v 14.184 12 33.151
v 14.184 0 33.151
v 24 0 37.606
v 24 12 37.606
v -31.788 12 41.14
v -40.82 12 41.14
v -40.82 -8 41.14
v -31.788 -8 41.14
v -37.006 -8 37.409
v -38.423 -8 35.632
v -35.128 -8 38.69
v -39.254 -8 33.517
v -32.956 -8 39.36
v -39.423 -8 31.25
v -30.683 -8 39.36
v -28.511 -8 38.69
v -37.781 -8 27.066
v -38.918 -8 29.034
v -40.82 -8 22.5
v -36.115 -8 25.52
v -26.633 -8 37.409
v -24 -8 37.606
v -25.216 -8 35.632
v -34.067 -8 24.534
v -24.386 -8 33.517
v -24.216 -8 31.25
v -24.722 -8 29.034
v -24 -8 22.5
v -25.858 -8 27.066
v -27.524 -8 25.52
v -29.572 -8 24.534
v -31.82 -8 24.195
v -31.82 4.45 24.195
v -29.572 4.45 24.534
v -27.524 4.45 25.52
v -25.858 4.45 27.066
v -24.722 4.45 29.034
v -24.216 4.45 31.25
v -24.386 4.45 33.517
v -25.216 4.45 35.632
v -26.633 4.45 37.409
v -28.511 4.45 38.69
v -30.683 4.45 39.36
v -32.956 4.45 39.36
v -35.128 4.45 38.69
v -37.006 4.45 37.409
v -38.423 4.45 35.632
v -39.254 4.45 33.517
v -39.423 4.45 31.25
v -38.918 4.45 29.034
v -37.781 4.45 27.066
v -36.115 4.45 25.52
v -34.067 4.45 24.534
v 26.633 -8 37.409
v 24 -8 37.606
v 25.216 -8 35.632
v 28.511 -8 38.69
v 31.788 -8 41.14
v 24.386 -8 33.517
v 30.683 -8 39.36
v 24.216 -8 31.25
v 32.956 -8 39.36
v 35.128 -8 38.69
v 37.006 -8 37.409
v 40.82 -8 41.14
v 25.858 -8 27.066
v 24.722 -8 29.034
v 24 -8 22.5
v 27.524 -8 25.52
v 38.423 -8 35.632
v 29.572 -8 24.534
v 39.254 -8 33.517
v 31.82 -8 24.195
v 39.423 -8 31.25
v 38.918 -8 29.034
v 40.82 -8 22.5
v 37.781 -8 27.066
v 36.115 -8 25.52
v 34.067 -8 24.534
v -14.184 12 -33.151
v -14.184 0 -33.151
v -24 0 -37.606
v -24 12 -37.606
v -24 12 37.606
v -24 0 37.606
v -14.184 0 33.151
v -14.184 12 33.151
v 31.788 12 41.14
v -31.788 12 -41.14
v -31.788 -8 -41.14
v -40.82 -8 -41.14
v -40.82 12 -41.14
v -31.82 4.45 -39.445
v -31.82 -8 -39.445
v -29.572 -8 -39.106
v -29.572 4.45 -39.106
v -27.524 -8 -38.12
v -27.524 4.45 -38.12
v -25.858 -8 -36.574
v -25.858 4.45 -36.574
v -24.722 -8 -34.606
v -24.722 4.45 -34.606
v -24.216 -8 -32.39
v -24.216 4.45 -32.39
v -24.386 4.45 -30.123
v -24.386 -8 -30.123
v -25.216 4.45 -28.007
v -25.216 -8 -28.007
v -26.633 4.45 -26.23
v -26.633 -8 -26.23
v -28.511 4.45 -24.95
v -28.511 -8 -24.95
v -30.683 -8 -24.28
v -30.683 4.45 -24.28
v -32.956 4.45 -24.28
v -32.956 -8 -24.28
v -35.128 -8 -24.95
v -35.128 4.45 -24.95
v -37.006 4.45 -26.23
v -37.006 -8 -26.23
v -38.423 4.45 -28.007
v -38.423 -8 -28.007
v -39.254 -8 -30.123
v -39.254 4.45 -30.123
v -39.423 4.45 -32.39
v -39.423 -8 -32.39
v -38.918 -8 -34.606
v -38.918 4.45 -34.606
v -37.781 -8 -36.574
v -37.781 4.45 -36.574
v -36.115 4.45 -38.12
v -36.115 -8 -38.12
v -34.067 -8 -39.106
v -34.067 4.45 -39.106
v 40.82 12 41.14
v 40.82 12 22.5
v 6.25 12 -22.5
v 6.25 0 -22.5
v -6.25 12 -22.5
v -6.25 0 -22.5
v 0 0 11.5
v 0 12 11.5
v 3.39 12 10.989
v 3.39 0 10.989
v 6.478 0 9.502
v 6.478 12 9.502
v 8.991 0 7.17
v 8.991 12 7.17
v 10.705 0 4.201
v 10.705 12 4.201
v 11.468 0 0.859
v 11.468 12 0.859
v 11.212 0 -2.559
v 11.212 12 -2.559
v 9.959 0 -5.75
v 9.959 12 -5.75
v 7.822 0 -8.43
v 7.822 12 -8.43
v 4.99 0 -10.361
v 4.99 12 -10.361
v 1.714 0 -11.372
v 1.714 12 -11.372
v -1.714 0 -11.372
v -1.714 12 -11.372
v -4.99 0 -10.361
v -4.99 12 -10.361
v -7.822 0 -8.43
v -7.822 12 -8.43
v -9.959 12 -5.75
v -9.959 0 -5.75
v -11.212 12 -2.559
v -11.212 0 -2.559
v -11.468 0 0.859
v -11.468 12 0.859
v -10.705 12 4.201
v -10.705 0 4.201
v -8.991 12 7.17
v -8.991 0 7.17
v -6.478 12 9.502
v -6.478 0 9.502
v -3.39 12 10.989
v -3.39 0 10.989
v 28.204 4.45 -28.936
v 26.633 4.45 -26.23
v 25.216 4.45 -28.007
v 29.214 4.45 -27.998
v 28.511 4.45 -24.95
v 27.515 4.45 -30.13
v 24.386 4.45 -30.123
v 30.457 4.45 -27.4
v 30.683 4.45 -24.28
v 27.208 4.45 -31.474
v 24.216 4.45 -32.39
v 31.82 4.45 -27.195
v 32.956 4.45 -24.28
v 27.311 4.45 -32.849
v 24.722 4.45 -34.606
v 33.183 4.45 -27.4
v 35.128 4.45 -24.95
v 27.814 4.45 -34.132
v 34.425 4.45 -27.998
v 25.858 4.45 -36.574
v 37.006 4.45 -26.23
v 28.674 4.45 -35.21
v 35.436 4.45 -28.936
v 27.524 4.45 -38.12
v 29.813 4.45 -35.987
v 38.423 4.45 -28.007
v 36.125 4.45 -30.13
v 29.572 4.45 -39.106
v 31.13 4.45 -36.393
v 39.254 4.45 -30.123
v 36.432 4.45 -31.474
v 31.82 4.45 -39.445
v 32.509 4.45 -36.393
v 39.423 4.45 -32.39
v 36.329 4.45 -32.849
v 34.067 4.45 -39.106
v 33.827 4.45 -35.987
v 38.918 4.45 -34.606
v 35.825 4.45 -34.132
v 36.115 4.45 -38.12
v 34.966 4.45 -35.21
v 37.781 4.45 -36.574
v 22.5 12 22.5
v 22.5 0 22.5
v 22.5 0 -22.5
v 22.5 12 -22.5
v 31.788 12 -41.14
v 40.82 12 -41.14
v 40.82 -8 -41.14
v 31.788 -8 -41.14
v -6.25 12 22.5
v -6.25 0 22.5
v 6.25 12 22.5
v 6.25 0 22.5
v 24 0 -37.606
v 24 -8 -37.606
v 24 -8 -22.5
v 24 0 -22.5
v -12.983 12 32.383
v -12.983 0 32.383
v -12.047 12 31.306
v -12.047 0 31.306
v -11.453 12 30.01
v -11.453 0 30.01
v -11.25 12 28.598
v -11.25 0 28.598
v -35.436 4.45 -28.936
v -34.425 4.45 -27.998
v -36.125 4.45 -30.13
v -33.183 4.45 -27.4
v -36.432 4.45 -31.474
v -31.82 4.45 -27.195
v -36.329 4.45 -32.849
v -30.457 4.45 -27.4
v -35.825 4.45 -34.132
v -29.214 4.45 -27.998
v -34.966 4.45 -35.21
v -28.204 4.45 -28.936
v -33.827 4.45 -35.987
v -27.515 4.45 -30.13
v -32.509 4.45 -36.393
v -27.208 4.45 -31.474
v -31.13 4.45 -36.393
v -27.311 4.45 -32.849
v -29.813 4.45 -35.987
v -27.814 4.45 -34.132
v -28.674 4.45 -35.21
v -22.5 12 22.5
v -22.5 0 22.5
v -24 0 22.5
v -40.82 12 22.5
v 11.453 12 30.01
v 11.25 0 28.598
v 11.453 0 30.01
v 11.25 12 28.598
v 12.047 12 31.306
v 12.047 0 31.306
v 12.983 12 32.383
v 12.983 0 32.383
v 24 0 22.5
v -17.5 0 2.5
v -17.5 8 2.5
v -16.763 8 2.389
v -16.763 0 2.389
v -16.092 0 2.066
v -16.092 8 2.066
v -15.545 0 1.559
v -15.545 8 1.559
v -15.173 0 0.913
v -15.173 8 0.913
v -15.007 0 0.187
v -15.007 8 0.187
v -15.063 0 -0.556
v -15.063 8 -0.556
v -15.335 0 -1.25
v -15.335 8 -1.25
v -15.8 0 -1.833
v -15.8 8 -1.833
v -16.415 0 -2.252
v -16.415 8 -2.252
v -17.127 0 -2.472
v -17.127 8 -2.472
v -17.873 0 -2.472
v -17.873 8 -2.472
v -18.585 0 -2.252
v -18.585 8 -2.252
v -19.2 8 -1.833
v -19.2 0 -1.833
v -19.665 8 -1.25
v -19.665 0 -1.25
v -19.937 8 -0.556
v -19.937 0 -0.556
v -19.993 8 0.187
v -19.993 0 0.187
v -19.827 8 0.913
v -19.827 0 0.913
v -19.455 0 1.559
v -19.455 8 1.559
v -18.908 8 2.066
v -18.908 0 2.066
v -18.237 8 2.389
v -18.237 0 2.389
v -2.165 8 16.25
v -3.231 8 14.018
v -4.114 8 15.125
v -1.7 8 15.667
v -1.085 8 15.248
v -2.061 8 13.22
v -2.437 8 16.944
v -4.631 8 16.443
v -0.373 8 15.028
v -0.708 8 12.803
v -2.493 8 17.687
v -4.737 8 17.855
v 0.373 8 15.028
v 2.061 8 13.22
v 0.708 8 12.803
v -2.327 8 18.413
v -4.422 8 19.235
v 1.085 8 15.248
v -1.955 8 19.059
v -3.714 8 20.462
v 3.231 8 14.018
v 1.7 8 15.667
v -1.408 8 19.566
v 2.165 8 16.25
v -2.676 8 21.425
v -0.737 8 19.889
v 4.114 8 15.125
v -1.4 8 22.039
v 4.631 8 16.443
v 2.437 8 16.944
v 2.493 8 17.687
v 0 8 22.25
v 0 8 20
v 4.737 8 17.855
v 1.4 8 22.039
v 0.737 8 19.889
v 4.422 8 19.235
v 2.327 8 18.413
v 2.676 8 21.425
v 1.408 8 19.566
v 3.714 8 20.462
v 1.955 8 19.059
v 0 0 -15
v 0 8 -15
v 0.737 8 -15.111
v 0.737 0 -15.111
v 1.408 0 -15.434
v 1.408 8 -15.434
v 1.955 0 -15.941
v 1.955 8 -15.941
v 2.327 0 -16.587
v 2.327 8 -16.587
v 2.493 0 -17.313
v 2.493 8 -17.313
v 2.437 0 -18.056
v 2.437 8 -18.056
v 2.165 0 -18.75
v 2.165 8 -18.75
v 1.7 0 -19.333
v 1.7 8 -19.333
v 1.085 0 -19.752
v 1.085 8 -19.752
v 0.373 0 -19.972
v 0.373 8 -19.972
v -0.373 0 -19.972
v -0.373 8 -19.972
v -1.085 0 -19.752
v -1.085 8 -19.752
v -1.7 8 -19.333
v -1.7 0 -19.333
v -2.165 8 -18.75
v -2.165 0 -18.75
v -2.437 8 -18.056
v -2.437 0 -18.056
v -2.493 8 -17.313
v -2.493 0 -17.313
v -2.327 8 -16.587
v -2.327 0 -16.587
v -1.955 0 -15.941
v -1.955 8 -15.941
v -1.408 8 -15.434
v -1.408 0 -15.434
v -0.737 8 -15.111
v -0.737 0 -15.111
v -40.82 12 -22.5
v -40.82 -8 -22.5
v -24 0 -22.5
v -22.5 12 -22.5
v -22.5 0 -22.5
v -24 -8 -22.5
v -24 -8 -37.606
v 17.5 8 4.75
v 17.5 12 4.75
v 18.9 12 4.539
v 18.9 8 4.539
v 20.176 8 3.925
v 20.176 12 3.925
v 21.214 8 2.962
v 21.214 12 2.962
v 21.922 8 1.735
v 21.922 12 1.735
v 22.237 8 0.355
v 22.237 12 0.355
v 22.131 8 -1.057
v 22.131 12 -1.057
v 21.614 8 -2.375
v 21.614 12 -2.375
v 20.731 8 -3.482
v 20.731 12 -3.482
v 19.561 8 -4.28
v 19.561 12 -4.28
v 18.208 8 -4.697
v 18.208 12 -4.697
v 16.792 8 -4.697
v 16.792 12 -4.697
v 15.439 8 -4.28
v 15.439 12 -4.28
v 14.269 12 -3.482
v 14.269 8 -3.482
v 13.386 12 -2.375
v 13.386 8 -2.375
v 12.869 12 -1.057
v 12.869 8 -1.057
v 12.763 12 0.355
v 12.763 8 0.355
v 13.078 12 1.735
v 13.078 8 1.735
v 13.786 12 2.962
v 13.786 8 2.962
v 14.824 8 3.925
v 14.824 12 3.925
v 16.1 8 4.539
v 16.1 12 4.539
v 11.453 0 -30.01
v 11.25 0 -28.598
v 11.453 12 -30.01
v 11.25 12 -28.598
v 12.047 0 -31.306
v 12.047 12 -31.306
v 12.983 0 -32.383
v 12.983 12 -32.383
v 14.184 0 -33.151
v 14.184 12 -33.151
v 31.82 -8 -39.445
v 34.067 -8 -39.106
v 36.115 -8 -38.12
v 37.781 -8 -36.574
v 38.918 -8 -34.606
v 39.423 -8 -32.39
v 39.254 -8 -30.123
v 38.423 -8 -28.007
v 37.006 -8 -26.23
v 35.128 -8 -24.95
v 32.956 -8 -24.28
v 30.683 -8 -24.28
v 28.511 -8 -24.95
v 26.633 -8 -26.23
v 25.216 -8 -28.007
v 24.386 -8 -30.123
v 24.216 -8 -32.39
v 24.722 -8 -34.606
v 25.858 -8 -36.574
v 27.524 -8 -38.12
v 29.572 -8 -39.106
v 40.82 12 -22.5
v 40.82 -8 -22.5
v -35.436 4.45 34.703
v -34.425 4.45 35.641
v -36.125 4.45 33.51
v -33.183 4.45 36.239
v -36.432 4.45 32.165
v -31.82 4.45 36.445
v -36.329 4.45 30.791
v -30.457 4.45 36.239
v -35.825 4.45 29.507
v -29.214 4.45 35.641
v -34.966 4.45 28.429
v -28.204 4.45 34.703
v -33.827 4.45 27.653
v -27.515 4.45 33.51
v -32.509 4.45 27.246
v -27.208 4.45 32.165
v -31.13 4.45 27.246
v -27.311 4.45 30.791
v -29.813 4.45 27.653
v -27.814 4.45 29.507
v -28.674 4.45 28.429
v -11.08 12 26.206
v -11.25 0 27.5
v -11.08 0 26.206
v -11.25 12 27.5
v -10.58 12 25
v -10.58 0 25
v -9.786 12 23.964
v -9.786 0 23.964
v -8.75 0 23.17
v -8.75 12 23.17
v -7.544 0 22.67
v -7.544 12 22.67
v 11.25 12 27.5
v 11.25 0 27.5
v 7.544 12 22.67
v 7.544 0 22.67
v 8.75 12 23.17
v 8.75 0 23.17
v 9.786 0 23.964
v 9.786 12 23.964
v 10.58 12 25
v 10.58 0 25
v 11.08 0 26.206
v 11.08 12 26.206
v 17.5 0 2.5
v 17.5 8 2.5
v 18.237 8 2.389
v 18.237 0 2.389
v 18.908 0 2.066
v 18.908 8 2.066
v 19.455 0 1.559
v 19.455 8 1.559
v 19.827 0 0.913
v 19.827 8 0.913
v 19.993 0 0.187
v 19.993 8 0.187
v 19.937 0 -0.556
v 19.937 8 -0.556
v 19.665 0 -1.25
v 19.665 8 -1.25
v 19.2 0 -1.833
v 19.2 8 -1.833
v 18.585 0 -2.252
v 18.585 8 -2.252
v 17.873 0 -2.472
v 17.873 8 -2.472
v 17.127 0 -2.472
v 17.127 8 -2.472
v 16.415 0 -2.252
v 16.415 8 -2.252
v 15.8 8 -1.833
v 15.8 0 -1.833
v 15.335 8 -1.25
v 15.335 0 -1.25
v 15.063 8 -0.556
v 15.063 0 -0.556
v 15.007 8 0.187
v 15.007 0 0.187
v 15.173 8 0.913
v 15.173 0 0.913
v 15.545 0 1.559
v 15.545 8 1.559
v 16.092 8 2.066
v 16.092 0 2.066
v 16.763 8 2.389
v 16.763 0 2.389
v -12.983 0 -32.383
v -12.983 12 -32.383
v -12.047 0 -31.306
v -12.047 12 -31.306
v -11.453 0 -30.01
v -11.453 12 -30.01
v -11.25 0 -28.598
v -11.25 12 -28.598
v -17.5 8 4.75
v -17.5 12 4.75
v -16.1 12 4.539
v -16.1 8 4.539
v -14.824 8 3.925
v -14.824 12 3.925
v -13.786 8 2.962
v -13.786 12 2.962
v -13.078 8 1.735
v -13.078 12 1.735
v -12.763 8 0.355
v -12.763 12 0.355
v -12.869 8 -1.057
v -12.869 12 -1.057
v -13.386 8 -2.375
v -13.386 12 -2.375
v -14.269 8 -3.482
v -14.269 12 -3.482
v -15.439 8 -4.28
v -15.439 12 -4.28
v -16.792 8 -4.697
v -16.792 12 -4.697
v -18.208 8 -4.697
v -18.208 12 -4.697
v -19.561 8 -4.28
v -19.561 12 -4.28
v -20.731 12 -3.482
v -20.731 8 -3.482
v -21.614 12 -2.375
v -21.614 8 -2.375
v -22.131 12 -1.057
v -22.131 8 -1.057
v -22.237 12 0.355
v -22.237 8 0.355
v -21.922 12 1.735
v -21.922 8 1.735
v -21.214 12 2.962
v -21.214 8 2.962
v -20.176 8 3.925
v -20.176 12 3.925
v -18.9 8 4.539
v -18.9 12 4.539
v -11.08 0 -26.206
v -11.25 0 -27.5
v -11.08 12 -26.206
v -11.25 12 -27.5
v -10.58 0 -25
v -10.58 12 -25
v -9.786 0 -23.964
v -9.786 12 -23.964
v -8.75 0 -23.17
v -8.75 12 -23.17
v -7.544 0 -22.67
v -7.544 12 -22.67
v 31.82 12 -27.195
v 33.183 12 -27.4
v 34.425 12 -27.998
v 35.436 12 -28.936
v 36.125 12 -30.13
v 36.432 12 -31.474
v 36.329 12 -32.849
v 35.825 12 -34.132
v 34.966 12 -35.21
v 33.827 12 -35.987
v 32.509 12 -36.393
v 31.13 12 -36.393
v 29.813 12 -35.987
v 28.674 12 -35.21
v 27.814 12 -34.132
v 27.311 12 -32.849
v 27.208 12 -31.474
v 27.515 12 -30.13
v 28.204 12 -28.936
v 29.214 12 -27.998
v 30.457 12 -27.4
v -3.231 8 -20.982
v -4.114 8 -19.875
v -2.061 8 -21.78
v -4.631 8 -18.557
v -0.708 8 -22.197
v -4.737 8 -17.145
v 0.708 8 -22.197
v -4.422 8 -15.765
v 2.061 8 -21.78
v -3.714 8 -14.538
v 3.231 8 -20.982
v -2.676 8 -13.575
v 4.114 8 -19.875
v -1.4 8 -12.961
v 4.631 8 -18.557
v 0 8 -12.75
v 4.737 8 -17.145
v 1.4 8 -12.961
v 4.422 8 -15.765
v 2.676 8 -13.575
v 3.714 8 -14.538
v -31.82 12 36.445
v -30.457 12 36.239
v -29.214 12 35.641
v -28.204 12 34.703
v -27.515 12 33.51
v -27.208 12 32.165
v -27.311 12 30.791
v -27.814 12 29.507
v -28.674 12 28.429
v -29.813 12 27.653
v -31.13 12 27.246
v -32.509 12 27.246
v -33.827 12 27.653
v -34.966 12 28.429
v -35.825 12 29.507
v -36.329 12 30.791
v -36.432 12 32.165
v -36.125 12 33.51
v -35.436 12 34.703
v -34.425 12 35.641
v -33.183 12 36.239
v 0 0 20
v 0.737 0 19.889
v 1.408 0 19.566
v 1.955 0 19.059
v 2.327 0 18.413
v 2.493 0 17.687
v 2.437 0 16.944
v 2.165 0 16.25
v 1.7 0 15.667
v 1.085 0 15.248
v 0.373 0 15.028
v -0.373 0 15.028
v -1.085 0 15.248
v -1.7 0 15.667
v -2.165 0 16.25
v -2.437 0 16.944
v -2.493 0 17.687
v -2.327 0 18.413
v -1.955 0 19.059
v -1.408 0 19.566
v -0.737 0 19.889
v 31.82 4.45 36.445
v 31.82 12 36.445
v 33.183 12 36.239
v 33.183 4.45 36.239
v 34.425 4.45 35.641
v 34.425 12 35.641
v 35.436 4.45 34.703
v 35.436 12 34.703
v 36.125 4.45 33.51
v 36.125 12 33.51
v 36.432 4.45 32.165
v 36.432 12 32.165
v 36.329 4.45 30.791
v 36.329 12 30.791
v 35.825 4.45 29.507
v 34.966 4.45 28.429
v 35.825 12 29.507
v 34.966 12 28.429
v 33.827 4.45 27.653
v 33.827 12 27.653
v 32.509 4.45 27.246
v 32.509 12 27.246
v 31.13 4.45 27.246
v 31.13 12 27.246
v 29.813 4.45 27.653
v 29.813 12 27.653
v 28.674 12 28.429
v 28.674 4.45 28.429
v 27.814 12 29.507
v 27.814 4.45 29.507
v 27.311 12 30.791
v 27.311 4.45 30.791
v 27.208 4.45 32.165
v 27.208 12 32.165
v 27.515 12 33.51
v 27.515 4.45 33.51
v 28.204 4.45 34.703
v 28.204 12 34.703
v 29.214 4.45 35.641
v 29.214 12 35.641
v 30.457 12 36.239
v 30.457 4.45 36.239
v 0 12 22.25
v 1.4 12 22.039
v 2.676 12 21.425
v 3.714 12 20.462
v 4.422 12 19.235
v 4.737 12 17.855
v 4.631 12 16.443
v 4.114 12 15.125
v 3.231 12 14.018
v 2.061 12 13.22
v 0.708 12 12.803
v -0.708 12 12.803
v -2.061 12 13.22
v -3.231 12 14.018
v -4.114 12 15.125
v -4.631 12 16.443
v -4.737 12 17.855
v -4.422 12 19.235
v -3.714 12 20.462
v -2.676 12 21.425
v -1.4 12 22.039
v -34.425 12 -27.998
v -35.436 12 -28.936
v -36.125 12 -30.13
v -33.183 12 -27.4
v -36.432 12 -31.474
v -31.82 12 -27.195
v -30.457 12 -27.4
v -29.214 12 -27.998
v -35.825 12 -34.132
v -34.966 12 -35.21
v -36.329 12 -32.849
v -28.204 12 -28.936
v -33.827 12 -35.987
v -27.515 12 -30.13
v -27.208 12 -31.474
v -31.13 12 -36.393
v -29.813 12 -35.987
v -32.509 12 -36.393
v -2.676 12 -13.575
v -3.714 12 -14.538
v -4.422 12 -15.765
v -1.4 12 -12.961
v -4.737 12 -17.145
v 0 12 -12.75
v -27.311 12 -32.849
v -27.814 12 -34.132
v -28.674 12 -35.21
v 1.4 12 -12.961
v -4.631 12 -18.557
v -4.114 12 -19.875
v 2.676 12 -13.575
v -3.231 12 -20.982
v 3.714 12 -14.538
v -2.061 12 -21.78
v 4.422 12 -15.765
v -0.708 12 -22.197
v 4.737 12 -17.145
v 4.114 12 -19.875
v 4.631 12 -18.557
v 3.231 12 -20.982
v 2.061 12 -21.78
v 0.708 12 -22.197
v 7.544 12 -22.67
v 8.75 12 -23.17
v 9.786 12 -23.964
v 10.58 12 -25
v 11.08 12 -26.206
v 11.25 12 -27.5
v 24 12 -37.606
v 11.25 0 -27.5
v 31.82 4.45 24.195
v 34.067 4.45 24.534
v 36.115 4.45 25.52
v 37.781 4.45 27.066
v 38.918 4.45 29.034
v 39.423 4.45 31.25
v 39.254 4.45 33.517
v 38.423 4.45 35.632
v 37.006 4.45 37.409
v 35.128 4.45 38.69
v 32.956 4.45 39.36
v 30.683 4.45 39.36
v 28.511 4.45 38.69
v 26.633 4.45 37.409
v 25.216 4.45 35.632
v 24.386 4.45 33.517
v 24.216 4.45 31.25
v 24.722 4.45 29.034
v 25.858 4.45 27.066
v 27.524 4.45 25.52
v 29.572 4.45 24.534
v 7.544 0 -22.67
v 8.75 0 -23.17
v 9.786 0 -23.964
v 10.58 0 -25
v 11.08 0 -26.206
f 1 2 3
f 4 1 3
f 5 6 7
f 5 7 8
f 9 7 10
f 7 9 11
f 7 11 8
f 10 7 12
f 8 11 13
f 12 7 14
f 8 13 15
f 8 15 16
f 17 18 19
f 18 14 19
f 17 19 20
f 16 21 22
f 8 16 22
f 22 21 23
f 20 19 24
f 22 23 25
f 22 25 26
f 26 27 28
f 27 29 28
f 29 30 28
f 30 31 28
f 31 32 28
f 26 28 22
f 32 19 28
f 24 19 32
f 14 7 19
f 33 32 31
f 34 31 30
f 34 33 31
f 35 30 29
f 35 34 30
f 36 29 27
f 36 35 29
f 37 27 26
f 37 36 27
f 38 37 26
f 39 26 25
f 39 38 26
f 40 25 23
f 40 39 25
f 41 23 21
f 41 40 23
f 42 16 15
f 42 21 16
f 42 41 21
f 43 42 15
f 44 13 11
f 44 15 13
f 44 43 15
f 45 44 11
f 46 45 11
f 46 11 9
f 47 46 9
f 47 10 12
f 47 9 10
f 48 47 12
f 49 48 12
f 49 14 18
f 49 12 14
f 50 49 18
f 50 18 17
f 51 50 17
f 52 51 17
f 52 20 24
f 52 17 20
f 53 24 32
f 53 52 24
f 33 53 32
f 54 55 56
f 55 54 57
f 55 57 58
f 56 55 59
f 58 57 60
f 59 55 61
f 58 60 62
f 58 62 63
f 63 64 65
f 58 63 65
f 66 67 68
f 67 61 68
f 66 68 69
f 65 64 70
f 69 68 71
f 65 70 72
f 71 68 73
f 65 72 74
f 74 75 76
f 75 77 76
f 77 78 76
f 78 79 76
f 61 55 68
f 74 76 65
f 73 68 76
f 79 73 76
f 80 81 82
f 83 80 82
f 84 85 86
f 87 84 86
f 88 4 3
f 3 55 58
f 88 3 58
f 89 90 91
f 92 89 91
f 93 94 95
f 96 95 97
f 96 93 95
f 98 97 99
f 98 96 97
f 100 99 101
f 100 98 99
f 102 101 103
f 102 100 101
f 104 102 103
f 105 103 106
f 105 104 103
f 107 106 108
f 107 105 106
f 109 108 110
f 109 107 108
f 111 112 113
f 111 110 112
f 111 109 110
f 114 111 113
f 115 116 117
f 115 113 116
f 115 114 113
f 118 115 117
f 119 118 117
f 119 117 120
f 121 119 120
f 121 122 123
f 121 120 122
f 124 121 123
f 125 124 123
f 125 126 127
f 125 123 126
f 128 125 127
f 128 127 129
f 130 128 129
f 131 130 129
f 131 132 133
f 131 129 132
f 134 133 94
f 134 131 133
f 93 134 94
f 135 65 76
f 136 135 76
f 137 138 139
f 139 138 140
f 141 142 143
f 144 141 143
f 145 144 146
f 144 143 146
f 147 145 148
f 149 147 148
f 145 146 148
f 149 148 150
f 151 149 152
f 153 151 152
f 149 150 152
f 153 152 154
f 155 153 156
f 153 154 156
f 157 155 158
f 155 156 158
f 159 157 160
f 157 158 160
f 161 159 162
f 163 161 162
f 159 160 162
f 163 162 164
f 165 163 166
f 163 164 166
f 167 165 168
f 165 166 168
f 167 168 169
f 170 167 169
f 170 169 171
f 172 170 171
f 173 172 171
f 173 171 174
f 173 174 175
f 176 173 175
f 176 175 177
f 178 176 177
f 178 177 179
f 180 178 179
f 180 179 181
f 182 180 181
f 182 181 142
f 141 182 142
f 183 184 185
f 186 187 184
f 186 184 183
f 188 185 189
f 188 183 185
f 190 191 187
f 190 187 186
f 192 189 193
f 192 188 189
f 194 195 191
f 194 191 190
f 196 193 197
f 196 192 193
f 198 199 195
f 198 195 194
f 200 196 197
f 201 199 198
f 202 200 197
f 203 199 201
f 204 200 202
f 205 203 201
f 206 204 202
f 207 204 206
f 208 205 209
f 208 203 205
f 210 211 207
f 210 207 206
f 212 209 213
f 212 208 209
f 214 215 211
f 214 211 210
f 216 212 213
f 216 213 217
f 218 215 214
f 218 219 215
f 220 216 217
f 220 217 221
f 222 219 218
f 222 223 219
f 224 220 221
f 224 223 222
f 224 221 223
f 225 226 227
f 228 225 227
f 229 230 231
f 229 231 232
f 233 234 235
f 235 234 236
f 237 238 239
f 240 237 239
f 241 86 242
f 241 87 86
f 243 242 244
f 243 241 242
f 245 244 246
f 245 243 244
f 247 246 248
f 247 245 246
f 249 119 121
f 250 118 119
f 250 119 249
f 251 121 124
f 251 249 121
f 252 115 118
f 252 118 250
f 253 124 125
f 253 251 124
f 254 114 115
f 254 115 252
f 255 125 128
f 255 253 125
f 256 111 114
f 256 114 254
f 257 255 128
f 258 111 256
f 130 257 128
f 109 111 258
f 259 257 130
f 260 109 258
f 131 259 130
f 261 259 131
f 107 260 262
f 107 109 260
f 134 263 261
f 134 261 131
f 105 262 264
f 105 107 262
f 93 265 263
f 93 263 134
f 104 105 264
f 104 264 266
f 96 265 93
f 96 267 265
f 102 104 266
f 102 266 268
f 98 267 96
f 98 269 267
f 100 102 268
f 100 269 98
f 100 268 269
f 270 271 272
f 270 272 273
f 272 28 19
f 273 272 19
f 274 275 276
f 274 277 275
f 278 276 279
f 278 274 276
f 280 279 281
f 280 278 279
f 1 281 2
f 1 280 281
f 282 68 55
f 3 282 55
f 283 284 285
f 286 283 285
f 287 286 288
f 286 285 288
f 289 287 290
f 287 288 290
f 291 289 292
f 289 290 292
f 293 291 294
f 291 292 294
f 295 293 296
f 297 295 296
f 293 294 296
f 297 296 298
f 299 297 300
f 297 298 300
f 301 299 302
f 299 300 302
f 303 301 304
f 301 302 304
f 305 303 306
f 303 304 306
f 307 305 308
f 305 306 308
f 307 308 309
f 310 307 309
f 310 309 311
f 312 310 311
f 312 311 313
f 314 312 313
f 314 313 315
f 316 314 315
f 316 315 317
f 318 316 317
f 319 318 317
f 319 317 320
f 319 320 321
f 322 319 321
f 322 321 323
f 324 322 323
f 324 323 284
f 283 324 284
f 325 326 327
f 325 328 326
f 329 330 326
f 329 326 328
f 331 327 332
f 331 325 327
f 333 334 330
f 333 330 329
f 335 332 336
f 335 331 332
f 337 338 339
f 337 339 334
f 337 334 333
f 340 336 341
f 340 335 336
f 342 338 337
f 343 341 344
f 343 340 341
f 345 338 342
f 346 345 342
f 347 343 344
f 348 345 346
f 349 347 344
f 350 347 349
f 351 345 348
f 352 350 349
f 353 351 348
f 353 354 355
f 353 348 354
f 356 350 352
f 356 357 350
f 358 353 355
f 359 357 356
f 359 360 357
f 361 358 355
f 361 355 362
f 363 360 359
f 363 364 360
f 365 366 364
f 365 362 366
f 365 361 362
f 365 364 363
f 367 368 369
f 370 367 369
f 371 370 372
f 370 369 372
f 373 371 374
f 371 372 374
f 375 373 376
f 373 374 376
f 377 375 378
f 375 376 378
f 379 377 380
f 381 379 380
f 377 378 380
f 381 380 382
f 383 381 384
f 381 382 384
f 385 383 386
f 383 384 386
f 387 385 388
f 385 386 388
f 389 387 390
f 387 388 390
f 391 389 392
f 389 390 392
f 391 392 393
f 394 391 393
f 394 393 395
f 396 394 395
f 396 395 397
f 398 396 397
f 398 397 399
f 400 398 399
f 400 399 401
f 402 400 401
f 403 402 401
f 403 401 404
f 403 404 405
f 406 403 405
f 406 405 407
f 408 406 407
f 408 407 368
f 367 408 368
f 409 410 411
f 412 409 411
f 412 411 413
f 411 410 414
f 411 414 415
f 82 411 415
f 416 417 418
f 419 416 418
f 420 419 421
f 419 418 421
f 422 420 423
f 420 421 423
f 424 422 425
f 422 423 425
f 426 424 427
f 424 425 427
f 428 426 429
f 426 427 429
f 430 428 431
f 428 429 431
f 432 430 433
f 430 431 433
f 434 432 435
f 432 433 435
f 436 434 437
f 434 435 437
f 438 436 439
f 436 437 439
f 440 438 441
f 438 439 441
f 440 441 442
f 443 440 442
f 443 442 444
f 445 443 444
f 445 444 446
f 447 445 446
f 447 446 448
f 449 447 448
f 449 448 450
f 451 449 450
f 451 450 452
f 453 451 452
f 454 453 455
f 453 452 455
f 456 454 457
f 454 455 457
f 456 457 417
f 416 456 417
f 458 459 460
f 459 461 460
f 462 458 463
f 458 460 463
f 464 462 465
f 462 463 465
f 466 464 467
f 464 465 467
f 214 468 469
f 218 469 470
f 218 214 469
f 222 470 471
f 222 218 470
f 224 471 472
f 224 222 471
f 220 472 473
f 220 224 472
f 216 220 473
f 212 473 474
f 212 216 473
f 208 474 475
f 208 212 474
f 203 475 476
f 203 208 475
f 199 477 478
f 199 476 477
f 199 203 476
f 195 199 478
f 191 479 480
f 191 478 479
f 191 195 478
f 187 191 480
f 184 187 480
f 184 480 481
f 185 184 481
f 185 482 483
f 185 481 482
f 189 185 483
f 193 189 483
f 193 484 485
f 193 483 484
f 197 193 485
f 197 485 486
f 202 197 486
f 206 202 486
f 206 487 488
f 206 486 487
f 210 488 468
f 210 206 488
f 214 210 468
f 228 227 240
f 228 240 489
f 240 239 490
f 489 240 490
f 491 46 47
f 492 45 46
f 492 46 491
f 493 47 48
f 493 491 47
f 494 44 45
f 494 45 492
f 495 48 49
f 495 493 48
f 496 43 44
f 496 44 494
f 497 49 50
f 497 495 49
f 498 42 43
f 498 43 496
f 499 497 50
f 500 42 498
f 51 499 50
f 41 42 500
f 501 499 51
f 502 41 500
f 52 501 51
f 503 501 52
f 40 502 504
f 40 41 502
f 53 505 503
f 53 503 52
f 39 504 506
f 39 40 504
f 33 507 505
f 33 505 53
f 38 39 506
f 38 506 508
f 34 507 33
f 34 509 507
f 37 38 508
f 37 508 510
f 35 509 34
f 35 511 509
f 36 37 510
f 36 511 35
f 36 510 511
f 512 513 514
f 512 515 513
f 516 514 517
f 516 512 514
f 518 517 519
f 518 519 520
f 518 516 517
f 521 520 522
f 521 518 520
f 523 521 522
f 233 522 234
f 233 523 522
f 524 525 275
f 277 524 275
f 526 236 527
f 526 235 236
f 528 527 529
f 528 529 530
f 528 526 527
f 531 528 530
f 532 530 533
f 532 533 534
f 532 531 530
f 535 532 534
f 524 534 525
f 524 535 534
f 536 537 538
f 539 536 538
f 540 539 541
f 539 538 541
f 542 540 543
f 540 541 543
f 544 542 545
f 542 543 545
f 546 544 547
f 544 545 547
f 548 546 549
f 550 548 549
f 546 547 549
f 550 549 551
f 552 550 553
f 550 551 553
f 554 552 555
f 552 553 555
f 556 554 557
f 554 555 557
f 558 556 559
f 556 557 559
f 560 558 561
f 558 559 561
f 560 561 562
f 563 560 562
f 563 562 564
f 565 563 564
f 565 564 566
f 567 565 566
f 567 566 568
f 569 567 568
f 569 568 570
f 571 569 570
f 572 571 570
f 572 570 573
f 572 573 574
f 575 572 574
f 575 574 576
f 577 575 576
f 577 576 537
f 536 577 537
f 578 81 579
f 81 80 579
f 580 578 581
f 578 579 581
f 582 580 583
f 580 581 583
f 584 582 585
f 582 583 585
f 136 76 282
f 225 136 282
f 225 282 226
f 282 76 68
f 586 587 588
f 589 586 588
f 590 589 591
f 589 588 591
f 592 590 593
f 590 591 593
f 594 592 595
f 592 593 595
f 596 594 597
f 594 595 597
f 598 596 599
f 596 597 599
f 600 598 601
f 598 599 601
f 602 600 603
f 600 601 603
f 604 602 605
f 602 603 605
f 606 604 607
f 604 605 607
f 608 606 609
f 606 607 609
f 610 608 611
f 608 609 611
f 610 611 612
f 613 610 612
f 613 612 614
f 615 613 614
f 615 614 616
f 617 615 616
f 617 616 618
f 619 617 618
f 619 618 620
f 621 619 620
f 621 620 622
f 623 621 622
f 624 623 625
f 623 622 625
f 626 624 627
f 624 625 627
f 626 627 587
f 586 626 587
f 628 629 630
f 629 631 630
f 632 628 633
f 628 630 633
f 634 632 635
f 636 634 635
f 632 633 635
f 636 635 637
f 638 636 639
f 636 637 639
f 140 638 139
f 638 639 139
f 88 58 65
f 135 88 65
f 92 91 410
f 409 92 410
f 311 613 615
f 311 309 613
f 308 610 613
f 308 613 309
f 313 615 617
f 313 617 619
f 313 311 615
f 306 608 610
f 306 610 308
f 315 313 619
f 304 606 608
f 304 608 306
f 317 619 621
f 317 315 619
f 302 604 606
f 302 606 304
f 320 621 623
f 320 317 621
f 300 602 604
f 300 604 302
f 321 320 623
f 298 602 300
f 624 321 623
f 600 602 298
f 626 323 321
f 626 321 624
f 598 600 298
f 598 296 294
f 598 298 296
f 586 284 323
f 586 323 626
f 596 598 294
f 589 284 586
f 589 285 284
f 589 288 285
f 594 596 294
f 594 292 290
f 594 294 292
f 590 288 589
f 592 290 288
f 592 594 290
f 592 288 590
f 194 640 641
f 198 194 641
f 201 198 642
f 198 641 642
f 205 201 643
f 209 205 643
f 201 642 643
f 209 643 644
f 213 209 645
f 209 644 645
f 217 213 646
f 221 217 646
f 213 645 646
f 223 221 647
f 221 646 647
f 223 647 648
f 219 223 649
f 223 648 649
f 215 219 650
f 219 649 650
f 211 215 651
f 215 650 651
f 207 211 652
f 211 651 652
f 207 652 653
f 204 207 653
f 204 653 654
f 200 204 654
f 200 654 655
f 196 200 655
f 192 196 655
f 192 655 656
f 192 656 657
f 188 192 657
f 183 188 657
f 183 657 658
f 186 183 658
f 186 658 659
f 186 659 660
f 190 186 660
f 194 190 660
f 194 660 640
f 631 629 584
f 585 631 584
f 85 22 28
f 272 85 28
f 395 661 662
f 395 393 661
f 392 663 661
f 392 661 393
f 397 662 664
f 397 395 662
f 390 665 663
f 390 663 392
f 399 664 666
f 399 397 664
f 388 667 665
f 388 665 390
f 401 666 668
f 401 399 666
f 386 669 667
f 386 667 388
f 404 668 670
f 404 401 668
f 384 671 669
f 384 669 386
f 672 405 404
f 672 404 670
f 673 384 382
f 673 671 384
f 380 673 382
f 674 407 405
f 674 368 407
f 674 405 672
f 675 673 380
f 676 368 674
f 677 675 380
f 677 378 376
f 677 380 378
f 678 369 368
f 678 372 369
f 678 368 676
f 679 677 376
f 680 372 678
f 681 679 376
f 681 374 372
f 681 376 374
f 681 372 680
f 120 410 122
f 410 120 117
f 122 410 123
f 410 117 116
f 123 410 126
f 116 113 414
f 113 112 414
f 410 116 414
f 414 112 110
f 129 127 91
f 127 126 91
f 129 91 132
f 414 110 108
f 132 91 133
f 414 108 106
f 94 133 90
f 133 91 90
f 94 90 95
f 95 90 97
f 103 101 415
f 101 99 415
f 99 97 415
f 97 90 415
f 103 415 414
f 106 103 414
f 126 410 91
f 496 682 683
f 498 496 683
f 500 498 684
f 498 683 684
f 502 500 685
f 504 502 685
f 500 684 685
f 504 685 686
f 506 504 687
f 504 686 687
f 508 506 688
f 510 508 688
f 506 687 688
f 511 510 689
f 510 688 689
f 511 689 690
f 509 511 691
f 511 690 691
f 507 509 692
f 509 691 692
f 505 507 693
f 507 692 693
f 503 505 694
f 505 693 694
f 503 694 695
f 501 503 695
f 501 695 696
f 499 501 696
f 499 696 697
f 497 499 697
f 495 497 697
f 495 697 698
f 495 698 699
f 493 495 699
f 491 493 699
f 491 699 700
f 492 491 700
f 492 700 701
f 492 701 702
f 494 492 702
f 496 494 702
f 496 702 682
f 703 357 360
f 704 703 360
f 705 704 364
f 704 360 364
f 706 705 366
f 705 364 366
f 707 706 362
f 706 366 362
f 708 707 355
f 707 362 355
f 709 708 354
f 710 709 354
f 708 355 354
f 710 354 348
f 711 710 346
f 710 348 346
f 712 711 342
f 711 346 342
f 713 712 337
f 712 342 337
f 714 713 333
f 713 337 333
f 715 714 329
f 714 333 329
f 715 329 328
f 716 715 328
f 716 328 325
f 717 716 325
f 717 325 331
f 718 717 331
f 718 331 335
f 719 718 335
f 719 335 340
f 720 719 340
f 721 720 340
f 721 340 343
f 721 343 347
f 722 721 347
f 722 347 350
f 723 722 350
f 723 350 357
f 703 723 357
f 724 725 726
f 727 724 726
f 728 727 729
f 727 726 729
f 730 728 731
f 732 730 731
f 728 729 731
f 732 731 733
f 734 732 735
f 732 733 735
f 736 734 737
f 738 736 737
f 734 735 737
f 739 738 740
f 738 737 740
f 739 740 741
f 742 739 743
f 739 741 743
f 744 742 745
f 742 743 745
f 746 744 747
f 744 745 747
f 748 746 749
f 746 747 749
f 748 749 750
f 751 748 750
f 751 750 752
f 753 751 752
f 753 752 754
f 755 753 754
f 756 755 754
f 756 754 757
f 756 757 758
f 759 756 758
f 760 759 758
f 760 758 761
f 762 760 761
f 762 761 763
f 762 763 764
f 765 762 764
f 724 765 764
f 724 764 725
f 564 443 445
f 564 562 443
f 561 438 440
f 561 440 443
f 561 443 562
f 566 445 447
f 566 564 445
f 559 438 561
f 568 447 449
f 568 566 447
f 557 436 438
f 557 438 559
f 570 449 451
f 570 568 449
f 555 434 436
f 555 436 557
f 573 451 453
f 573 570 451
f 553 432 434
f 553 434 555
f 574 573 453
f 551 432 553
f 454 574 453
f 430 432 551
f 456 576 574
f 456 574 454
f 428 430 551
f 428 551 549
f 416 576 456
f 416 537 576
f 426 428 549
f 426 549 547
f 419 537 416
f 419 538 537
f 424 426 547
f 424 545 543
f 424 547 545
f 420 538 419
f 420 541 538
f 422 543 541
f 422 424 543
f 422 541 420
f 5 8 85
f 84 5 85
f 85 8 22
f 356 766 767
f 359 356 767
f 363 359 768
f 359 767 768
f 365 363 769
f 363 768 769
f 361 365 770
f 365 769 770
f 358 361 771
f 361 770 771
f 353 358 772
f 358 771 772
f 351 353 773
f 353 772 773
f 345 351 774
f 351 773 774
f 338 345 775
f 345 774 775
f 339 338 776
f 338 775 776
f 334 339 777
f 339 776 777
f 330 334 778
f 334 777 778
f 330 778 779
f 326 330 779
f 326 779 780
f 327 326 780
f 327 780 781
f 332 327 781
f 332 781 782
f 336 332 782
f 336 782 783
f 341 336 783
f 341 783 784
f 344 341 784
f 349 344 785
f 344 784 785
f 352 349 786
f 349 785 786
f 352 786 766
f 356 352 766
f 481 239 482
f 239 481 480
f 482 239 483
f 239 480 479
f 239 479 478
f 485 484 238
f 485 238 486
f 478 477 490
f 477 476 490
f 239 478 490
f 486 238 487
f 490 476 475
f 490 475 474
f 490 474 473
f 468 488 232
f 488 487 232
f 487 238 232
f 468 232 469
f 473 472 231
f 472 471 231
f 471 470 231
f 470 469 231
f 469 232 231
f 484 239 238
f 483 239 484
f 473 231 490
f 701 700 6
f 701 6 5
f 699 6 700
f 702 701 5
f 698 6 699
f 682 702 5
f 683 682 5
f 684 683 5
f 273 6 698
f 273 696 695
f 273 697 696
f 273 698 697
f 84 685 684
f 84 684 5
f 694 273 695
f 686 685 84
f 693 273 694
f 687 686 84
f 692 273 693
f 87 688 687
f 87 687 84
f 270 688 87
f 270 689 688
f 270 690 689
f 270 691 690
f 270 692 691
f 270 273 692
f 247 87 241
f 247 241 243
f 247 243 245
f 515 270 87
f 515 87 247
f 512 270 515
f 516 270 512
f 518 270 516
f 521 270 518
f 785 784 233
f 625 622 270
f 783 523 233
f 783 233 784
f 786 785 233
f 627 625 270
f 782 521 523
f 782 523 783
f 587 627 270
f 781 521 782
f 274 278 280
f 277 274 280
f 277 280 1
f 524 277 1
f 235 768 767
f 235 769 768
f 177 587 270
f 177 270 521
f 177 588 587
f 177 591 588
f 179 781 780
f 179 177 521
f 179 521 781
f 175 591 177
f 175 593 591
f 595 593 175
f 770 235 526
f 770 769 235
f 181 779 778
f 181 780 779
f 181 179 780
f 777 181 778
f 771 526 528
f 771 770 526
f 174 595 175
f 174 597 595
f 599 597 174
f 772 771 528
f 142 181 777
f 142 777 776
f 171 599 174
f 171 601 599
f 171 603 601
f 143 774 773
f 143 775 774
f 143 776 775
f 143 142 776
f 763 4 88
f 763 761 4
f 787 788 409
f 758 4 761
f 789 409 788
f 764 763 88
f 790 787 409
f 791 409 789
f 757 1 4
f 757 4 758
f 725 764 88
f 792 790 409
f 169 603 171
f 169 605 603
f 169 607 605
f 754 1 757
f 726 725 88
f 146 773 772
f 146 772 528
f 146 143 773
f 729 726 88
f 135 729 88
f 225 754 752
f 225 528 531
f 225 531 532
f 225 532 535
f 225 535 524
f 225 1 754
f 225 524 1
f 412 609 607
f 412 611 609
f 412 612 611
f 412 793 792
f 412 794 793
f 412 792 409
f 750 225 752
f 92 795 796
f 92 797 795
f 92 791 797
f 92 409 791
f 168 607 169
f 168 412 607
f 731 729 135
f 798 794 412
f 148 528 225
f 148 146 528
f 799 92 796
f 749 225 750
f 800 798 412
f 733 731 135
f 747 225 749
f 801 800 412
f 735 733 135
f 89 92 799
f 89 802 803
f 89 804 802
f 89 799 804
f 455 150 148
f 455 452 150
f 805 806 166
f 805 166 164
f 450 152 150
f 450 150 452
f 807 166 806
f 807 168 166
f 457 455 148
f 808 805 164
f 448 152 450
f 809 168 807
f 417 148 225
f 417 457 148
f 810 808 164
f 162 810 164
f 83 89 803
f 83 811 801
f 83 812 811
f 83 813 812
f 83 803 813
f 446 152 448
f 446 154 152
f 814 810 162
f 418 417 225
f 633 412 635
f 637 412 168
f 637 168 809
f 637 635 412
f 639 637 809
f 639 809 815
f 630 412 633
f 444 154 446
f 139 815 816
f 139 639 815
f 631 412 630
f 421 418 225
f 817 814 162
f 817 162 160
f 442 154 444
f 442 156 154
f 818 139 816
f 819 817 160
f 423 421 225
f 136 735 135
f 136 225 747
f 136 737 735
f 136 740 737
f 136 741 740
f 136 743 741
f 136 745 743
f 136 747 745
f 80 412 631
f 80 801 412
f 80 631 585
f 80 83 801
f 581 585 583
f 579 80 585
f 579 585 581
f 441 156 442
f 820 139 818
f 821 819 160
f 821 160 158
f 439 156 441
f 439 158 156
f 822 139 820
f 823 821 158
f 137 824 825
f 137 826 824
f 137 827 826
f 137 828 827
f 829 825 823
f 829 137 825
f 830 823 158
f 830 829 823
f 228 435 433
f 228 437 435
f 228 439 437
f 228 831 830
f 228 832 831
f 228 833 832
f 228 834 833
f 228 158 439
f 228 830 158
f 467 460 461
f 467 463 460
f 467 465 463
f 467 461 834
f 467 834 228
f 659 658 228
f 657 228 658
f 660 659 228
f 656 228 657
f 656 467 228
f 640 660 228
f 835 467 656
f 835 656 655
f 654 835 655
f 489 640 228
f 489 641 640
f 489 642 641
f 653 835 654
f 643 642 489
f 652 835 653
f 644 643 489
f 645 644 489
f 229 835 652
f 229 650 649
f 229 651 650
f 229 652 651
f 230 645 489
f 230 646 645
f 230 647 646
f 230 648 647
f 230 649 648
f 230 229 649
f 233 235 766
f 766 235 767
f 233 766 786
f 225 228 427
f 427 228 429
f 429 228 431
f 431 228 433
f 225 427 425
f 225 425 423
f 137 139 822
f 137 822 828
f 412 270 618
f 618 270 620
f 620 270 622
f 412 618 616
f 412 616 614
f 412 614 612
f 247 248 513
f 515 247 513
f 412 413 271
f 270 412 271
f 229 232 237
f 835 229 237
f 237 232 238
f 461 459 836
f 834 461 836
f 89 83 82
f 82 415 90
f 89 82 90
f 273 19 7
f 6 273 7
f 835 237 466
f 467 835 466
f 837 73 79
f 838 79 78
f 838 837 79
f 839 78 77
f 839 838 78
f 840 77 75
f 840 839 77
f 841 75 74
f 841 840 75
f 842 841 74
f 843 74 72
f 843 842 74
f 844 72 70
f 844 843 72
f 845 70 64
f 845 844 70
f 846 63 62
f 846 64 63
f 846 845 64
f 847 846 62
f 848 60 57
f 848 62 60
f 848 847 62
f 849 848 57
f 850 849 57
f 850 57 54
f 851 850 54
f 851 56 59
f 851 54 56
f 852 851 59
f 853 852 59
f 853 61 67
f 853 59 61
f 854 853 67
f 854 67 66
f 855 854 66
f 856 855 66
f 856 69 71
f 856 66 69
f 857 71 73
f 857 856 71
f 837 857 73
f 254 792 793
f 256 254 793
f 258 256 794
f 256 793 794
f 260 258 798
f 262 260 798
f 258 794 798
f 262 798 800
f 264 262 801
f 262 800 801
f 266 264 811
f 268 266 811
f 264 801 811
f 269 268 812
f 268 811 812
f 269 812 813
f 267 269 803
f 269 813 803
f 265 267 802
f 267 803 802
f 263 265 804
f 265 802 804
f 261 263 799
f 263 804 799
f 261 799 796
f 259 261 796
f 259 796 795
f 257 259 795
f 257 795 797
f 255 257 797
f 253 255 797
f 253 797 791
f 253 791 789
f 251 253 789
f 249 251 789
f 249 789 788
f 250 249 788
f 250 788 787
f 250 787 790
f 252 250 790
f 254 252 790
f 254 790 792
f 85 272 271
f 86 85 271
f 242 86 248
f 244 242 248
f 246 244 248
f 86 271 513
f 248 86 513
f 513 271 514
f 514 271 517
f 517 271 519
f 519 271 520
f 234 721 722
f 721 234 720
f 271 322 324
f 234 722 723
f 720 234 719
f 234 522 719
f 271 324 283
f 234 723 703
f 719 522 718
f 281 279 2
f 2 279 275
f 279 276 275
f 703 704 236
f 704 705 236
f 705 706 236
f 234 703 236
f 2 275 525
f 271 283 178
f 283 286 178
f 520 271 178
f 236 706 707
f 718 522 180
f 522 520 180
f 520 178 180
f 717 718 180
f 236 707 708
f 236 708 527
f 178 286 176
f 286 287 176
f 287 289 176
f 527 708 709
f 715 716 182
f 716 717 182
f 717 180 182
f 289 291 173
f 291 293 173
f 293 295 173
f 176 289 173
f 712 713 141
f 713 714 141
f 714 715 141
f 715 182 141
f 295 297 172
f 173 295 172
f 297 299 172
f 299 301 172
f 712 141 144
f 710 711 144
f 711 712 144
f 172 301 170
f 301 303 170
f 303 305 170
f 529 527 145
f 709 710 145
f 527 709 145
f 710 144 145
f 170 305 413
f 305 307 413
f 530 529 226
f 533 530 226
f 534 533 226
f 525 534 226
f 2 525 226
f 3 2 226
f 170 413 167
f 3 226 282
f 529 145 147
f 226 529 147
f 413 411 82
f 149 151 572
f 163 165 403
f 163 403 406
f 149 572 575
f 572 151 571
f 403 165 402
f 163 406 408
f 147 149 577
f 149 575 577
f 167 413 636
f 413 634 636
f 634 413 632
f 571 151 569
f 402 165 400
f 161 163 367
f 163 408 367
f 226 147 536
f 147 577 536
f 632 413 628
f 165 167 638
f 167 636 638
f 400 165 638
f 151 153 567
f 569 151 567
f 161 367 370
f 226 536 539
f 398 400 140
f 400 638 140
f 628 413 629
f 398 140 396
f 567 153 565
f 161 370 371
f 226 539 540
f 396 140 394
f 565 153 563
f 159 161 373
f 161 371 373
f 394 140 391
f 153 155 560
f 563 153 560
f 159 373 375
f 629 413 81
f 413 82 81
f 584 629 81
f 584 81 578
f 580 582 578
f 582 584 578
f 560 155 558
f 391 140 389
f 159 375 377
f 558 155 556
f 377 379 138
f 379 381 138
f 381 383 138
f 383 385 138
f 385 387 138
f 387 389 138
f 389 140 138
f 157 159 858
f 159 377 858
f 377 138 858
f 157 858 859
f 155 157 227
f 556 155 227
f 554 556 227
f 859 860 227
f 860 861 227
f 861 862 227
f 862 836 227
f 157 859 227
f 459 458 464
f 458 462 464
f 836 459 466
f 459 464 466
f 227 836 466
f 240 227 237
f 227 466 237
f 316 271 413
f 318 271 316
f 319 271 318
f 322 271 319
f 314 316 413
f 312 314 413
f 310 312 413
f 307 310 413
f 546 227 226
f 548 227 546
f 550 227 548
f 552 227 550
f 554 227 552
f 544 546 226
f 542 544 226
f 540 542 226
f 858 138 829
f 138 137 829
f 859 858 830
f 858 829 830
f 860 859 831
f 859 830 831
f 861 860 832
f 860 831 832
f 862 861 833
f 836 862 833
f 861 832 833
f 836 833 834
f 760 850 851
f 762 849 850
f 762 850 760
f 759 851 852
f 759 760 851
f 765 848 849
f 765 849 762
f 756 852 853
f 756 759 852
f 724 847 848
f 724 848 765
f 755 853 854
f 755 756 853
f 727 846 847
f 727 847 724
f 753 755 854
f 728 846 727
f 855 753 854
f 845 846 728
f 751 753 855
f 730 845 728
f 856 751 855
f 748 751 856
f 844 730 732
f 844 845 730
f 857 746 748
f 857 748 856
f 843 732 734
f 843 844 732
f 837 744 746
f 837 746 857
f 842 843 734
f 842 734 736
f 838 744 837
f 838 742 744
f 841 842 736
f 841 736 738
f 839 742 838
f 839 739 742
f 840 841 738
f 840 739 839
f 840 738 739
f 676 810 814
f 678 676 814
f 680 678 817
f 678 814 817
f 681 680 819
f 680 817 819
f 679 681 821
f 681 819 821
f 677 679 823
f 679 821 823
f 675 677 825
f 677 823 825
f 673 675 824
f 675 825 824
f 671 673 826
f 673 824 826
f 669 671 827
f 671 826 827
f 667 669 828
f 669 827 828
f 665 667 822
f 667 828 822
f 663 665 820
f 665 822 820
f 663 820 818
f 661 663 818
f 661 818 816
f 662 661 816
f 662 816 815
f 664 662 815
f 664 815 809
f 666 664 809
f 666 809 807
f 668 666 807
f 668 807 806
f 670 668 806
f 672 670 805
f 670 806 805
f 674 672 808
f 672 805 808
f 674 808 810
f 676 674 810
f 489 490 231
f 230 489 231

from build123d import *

# Parameters (mm, degrees)
BOSS_EXTRUDE1_DEPTH      = 12
BOSS_EXTRUDE2_DEPTH      = 12
BOSS_EXTRUDE2_DEPTH_BACK = 8
SKETCH2_R                = 11.5
SKETCH2_R_2              = 4.625
SKETCH2_R_3              = 2.5
CUT_EXTRUDE1_DEPTH       = 62.308564335
CUT_EXTRUDE2_DEPTH       = 60.183951041
CUT_EXTRUDE2_DEPTH_BACK  = 4.45
SKETCH3_R                = 7.625
FILLET3_R                = 5
SKETCH4_R                = 4.75
CUT_EXTRUDE3_DEPTH       = 4


with BuildPart() as part:
    # Sketch1 → Boss-Extrude1 (new body)
    with BuildSketch(Plane(origin=(0, 0, 0), x_dir=(1, 0, 0), z_dir=(0, 1, 0))):
        Polygon((-22.5, 22.5), (-22.5, -22.5), (-24, -22.5), (-24, -37.605531925), (-11.25, -31.819805153), (-11.25, -22.5), (11.25, -22.5), (11.25, -31.819805153), (24, -37.605531925), (24, -22.5), (22.5, -22.5), (22.5, 22.5), (24, 22.5), (24, 37.605531925), (11.25, 31.819805153), (11.25, 22.5), (-11.25, 22.5), (-11.25, 31.819805153), (-24, 37.605531925), (-24, 22.5), align=None)
    extrude(amount=BOSS_EXTRUDE1_DEPTH)

    # Sketch1<3> → Boss-Extrude2 (add, two sides: drawn at the far end of the back side and taken through both)
    with BuildSketch(Plane(origin=(0, 0, 0), x_dir=(1, 0, 0), z_dir=(0, 1, 0)).offset(-BOSS_EXTRUDE2_DEPTH_BACK)):
        Polygon((-24, -37.605531925), (-24, -22.5), (-40.819805153, -22.5), (-40.819805153, -41.139805153), (-31.788474194, -41.139805153), align=None)
        Polygon((-40.819805153, 22.5), (-24, 22.5), (-24, 37.605531925), (-31.788474194, 41.139805153), (-40.819805153, 41.139805153), align=None)
        Polygon((24, -22.5), (24, -37.605531925), (31.788474194, -41.139805153), (40.819805153, -41.139805153), (40.819805153, -22.5), align=None)
        Polygon((31.788474194, 41.139805153), (24, 37.605531925), (24, 22.5), (40.819805153, 22.5), (40.819805153, 41.139805153), align=None)
    extrude(amount=BOSS_EXTRUDE2_DEPTH + BOSS_EXTRUDE2_DEPTH_BACK)

    # Sketch2 → Cut-Extrude1 (cut, through all)
    with BuildSketch(Plane(origin=(0, 12, 0), x_dir=(1, 0, 0), z_dir=(0, 1, 0))):
        with Locations(Location((0, 0, 0), (0, 0, 270))):
            Circle(SKETCH2_R)
        with Locations(Location((-31.819805153, 31.819805153, 0), (0, 0, 270))):
            Circle(SKETCH2_R_2)
        with Locations(Location((31.819805153, 31.819805153, 0), (0, 0, 270))):
            Circle(SKETCH2_R_2)
        with Locations(Location((31.819805153, -31.819805153, 0), (0, 0, 270))):
            Circle(SKETCH2_R_2)
        with Locations(Location((-31.819805153, -31.819805153, 0), (0, 0, 270))):
            Circle(SKETCH2_R_2)
        with Locations(Location((0, 17.5, 0), (0, 0, 270))):
            Circle(SKETCH2_R_3)
        with Locations(Location((17.5, 0, 0), (0, 0, 270))):
            Circle(SKETCH2_R_3)
        with Locations(Location((0, -17.5, 0), (0, 0, 270))):
            Circle(SKETCH2_R_3)
        with Locations(Location((-17.5, 0, 0), (0, 0, 270))):
            Circle(SKETCH2_R_3)
    extrude(amount=-CUT_EXTRUDE1_DEPTH, mode=Mode.SUBTRACT)

    # Sketch3 → Cut-Extrude2 (cut, two sides: drawn at the far end of the back side and taken through both)
    with BuildSketch(Plane.XZ.offset(-CUT_EXTRUDE2_DEPTH_BACK)):
        with Locations(Location((31.819805153, -31.819805153, 0), (0, 0, 270))):
            Circle(SKETCH3_R)
        with Locations(Location((-31.819805153, -31.819805153, 0), (0, 0, 270))):
            Circle(SKETCH3_R)
        with Locations(Location((-31.819805153, 31.819805153, 0), (0, 0, 270))):
            Circle(SKETCH3_R)
        with Locations(Location((31.819805153, 31.819805153, 0), (0, 0, 270))):
            Circle(SKETCH3_R)
    extrude(amount=CUT_EXTRUDE2_DEPTH + CUT_EXTRUDE2_DEPTH_BACK, mode=Mode.SUBTRACT)

    # Fillet3
    fillet3_edges = [part.edges().sort_by_distance(p)[0] for p in [
        (11.25, 6, 31.819805153),
        (11.25, 6, 22.5),
        (-11.25, 6, 22.5),
        (-11.25, 6, 31.819805153),
        (-11.25, 6, -31.819805153),
        (-11.25, 6, -22.5),
        (11.25, 6, -22.5),
        (11.25, 6, -31.819805153),
    ]]
    fillet(fillet3_edges, radius=FILLET3_R)

    # Sketch4 → Cut-Extrude3 (cut)
    with BuildSketch(Plane(origin=(0, 12, 0), x_dir=(1, 0, 0), z_dir=(0, 1, 0))):
        with Locations(Location((0, 17.5, 0), (0, 0, 270))):
            Circle(SKETCH4_R)
        with Locations(Location((17.5, 0, 0), (0, 0, 270))):
            Circle(SKETCH4_R)
        with Locations(Location((0, -17.5, 0), (0, 0, 270))):
            Circle(SKETCH4_R)
        with Locations(Location((-17.5, 0, 0), (0, 0, 270))):
            Circle(SKETCH4_R)
    extrude(amount=-CUT_EXTRUDE3_DEPTH, mode=Mode.SUBTRACT)


solid = part.part
